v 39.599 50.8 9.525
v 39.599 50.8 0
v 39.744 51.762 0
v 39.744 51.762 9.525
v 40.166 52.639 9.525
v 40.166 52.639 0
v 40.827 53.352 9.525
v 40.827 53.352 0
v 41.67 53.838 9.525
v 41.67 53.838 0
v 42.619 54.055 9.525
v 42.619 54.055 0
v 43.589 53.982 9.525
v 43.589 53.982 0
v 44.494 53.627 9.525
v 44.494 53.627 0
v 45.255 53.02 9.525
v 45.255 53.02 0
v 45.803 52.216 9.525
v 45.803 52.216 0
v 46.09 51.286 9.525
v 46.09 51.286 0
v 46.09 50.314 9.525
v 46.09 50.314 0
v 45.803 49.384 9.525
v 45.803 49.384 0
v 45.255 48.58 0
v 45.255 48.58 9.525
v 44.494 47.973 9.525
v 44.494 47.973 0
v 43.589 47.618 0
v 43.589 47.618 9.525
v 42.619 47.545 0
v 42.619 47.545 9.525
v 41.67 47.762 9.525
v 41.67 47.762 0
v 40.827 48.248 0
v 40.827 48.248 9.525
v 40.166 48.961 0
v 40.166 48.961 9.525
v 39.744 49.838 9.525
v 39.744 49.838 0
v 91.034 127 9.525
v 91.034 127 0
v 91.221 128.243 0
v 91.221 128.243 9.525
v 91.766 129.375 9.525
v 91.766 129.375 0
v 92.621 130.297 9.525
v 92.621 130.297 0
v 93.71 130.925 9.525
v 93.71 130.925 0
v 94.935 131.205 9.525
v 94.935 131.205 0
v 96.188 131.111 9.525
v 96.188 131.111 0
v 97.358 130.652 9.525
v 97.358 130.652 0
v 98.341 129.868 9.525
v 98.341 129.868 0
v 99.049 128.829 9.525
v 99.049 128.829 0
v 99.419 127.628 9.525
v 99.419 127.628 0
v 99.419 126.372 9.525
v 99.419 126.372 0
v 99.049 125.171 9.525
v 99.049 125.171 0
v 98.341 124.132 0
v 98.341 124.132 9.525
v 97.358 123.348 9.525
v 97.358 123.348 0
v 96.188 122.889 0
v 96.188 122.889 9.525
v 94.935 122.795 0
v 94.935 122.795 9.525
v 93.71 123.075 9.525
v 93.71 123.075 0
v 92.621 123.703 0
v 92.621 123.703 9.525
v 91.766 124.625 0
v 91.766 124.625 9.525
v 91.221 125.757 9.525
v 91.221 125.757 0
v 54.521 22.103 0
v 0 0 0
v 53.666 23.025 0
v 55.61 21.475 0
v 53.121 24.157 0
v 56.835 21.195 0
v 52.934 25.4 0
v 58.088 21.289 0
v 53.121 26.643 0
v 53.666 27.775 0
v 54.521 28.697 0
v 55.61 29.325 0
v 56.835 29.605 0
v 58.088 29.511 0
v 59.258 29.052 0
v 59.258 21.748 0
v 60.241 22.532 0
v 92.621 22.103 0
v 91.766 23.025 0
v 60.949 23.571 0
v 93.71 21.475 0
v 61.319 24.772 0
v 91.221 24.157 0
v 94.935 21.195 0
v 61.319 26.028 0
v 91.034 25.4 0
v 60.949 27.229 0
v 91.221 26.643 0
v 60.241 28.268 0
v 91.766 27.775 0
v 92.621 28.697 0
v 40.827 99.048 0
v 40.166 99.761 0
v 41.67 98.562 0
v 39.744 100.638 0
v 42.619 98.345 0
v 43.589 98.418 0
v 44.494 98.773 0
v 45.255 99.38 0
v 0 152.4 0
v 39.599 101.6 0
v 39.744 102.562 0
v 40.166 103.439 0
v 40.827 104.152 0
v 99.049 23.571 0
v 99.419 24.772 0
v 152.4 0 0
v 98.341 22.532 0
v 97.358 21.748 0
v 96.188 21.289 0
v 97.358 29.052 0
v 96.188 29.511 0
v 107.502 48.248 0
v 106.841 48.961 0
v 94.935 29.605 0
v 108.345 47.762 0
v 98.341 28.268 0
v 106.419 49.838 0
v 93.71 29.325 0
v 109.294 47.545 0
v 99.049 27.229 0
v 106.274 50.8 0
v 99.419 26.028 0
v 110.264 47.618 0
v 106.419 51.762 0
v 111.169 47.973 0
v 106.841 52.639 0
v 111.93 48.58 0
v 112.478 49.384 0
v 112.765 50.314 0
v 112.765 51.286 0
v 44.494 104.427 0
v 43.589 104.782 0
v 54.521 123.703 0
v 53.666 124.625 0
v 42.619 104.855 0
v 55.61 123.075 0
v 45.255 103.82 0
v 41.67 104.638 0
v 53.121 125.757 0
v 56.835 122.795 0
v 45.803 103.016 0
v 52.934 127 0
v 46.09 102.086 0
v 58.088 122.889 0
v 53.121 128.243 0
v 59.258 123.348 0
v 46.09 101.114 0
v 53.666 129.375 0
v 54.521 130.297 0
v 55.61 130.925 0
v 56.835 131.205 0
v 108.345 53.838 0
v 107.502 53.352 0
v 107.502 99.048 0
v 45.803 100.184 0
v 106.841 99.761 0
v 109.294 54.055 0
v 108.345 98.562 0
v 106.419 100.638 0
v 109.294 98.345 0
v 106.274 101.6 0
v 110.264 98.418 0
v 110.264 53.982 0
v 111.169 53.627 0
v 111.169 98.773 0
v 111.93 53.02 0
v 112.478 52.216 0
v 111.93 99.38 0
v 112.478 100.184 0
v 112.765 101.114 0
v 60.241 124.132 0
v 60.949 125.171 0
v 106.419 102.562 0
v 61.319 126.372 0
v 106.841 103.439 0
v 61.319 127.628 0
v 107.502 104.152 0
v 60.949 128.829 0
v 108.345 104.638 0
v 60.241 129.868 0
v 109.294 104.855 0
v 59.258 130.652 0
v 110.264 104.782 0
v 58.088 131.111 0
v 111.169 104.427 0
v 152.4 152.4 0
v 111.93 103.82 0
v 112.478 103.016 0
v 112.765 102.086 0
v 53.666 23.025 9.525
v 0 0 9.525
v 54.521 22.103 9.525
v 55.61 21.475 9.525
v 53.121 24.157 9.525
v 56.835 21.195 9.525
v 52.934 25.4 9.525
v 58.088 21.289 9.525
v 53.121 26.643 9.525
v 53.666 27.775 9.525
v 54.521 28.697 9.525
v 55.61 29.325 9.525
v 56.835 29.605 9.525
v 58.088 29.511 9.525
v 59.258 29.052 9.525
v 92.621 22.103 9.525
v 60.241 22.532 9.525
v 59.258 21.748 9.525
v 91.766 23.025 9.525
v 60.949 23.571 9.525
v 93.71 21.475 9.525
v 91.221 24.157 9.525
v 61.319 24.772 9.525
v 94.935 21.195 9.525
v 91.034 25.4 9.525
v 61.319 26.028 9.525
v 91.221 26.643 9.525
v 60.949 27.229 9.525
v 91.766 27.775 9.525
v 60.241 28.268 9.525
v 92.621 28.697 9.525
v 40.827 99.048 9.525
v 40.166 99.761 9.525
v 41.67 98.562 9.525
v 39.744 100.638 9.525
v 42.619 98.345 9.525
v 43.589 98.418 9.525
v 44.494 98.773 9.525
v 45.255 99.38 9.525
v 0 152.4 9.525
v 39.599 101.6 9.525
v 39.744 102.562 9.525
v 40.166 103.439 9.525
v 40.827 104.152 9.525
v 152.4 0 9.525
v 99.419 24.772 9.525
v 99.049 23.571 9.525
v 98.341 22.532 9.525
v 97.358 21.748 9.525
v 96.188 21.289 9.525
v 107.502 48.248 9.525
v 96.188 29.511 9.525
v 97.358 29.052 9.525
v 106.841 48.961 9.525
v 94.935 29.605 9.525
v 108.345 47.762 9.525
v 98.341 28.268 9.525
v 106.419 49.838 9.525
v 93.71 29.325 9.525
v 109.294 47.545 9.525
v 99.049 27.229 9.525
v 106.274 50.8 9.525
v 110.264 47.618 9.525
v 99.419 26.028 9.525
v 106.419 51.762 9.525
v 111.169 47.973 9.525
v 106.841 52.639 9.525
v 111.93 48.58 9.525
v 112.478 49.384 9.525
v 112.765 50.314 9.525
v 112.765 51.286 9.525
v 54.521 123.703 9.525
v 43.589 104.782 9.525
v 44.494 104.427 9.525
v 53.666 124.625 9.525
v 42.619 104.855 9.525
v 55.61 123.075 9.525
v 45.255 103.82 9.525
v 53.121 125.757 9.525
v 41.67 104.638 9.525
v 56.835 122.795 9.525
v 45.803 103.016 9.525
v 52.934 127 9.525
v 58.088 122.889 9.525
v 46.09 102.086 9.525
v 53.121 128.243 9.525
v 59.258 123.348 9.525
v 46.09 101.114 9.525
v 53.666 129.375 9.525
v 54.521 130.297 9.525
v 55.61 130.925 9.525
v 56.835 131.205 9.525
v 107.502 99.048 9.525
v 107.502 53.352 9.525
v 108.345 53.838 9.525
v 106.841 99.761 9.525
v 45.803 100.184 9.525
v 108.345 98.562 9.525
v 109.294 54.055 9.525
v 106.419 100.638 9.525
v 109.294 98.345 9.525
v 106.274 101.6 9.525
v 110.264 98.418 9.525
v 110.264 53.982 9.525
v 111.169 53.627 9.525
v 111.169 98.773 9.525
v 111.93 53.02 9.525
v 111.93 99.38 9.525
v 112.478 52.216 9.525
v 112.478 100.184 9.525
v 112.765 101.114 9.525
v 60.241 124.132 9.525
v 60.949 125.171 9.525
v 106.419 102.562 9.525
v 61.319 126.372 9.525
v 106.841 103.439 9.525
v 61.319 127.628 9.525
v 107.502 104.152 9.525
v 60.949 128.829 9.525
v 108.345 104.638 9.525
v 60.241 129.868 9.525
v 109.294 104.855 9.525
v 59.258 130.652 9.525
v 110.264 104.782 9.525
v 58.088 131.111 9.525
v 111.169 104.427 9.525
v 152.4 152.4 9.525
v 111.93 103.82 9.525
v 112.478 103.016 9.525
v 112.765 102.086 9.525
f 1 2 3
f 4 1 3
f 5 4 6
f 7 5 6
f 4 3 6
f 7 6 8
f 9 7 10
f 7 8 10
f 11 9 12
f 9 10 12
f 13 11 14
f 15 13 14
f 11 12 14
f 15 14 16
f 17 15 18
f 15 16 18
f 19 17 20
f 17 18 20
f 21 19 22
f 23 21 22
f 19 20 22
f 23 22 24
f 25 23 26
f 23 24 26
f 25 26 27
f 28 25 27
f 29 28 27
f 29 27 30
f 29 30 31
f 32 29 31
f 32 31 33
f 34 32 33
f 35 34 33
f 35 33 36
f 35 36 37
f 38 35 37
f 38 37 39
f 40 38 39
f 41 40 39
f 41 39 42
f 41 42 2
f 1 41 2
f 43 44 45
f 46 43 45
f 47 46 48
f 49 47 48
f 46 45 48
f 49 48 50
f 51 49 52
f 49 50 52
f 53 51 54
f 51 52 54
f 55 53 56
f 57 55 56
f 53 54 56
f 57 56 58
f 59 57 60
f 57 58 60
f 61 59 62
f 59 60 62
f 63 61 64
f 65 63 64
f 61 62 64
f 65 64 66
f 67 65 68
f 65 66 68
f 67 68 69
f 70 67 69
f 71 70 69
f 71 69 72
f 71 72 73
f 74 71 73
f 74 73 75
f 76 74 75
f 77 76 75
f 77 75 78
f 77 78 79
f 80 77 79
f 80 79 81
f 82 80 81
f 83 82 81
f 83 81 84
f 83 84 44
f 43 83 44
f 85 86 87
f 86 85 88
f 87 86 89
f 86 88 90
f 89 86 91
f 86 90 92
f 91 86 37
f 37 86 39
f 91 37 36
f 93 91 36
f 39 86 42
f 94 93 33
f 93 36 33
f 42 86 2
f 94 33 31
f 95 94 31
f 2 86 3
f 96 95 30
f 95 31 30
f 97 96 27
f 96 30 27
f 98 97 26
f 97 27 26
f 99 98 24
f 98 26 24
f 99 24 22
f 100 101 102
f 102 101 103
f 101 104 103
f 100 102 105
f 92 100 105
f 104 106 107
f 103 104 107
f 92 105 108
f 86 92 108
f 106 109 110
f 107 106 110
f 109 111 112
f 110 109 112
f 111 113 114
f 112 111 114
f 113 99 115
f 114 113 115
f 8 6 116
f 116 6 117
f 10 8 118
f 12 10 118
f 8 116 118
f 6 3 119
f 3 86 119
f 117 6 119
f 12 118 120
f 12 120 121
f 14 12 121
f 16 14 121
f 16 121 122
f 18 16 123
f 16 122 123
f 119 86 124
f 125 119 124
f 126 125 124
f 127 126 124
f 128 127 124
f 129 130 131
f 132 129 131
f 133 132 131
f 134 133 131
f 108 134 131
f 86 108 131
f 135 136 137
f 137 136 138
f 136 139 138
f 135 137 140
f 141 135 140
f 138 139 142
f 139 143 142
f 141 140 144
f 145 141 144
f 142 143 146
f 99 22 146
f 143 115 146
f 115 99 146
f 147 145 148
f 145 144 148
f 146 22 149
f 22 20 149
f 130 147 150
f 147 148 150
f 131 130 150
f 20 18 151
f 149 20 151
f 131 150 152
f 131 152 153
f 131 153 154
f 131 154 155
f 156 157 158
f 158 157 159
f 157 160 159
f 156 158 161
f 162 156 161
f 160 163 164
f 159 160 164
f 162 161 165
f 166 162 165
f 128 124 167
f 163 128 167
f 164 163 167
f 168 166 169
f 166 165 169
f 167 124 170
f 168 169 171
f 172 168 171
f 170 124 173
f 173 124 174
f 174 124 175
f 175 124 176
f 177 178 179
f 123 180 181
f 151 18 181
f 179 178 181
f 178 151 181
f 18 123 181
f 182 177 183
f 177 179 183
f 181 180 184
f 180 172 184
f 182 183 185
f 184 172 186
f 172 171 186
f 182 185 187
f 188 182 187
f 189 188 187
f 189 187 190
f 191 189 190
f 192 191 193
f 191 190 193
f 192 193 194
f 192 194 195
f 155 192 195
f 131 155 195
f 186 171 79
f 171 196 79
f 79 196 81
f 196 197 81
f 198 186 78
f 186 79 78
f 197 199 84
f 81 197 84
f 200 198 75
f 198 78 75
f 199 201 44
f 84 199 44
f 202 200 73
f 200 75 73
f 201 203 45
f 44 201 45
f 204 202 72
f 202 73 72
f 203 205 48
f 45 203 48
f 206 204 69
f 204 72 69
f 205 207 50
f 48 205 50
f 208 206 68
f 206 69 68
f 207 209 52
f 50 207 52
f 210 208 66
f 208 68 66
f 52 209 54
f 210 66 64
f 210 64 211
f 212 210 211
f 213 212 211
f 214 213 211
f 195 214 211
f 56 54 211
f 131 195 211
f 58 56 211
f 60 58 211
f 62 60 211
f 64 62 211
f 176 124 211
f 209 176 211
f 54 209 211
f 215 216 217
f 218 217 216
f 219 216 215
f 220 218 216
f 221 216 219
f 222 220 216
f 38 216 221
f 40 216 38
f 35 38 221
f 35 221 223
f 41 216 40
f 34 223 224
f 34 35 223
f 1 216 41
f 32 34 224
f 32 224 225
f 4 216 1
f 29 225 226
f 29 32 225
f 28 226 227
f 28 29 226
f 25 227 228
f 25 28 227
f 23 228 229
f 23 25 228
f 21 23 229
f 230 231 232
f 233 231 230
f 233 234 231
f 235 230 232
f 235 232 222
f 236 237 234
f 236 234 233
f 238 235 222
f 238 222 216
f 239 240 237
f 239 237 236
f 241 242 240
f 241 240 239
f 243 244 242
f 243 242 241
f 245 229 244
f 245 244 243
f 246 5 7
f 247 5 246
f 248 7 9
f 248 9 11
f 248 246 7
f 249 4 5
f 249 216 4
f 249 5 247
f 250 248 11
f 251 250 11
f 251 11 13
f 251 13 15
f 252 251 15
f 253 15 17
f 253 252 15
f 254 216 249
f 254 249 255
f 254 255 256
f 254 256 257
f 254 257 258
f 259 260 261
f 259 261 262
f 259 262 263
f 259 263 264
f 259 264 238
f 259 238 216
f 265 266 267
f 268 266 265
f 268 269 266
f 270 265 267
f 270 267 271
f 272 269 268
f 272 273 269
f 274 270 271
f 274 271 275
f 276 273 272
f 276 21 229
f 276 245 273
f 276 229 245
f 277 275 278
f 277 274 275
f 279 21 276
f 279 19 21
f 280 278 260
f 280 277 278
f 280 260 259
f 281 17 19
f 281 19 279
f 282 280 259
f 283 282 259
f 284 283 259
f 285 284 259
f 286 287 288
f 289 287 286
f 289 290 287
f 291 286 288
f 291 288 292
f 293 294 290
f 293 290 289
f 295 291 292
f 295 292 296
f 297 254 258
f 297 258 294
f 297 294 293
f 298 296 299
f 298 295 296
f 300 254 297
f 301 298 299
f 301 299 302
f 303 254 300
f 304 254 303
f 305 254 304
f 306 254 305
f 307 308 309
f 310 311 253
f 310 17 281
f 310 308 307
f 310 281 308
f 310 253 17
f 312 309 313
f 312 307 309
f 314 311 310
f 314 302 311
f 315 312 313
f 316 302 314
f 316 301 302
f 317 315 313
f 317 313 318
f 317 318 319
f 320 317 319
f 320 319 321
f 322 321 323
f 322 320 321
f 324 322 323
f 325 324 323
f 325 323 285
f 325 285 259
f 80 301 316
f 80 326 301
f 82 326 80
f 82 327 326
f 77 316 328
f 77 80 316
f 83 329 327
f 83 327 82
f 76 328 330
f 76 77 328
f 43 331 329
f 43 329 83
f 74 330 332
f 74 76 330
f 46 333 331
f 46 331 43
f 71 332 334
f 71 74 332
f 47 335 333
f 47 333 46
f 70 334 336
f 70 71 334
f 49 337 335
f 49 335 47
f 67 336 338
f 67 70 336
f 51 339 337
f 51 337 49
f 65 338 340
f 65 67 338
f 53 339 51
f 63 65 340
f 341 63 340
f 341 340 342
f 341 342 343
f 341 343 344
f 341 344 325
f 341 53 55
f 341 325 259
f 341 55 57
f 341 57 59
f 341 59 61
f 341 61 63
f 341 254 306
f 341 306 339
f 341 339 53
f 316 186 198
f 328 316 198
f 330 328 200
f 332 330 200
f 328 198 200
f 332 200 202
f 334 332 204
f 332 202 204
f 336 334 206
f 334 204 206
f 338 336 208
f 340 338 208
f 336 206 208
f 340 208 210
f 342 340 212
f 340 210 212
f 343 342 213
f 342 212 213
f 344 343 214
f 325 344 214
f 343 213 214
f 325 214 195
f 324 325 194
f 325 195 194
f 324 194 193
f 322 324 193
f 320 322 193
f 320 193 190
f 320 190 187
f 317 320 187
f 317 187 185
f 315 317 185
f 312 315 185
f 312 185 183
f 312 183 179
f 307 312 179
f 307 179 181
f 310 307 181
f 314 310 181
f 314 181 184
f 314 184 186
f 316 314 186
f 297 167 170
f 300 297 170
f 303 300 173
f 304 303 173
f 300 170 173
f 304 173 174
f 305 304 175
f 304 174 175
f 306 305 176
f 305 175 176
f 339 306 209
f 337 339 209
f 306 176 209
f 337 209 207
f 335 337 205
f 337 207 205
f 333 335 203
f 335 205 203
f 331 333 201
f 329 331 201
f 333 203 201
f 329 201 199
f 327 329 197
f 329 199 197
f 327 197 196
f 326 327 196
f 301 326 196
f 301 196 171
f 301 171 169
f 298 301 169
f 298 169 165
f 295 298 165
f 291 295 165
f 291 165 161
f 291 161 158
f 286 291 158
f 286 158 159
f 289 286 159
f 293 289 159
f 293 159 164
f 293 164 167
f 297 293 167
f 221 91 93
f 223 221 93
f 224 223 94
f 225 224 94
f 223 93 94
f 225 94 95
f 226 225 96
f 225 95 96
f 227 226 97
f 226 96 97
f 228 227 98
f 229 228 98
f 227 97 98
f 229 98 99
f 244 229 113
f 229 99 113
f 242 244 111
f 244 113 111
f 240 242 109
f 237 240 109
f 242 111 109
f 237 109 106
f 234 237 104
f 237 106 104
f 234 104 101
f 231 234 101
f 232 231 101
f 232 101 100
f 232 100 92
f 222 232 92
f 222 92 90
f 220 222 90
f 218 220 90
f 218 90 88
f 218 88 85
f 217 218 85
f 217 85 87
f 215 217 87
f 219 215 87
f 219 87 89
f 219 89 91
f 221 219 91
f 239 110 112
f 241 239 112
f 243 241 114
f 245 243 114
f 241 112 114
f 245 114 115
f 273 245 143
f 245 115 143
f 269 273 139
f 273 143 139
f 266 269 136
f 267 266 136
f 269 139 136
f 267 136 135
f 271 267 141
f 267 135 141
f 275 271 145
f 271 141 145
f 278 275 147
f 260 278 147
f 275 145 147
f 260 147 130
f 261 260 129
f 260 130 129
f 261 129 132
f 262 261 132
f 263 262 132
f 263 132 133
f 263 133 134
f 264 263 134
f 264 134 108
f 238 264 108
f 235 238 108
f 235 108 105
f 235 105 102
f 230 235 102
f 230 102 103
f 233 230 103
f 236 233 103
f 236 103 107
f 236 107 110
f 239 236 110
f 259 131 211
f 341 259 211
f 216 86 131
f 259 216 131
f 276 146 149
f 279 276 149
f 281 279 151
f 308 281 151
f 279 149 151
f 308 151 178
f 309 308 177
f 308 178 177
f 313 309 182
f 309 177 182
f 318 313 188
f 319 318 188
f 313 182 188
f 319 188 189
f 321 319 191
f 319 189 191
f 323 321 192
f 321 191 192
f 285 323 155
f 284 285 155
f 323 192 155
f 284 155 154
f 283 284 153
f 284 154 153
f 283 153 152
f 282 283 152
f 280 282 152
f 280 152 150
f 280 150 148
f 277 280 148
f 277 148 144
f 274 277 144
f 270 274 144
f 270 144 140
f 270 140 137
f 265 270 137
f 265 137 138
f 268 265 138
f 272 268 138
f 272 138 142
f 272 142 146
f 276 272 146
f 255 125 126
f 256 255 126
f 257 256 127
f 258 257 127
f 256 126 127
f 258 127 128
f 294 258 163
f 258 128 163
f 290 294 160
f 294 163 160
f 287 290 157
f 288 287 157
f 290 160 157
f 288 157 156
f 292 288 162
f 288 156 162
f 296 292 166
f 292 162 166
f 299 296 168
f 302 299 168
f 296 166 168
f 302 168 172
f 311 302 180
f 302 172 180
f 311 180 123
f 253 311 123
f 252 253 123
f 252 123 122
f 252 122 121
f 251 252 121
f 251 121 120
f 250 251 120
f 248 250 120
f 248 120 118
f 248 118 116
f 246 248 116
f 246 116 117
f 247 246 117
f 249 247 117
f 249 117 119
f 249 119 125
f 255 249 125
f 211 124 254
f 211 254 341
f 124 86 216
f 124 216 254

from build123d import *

# Parameters (mm, degrees)
SKETCH1_W                = 152.4
SKETCH1_H                = 152.4
BOSS_EXTRUDE1_DEPTH      = 9.525
F_5_16_18_TAPPED_HOLE1_D = 6.5278
F_5_16_CLEARANCE_HOLE1_D = 8.4328


with BuildPart() as part:
    # Sketch1 → Boss-Extrude1 (new body)
    with BuildSketch(Plane.XY):
        with Locations((76.2, 76.2)):
            Rectangle(SKETCH1_W, SKETCH1_H)
    extrude(amount=BOSS_EXTRUDE1_DEPTH)

    # 5/16-18 Tapped Hole1 (through all)
    with Locations(Plane.XY.offset(9.525)):
        with Locations((109.5375, 101.6), (42.8625, 101.6), (109.5375, 50.8), (42.8625, 50.8)):
            Hole(F_5_16_18_TAPPED_HOLE1_D / 2)

    # 5/16 Clearance Hole1 (through all)
    with Locations(Plane.XY.offset(9.525)):
        with Locations((95.25, 127), (57.15, 127), (95.25, 25.4), (57.15, 25.4)):
            Hole(F_5_16_CLEARANCE_HOLE1_D / 2)


solid = part.part
